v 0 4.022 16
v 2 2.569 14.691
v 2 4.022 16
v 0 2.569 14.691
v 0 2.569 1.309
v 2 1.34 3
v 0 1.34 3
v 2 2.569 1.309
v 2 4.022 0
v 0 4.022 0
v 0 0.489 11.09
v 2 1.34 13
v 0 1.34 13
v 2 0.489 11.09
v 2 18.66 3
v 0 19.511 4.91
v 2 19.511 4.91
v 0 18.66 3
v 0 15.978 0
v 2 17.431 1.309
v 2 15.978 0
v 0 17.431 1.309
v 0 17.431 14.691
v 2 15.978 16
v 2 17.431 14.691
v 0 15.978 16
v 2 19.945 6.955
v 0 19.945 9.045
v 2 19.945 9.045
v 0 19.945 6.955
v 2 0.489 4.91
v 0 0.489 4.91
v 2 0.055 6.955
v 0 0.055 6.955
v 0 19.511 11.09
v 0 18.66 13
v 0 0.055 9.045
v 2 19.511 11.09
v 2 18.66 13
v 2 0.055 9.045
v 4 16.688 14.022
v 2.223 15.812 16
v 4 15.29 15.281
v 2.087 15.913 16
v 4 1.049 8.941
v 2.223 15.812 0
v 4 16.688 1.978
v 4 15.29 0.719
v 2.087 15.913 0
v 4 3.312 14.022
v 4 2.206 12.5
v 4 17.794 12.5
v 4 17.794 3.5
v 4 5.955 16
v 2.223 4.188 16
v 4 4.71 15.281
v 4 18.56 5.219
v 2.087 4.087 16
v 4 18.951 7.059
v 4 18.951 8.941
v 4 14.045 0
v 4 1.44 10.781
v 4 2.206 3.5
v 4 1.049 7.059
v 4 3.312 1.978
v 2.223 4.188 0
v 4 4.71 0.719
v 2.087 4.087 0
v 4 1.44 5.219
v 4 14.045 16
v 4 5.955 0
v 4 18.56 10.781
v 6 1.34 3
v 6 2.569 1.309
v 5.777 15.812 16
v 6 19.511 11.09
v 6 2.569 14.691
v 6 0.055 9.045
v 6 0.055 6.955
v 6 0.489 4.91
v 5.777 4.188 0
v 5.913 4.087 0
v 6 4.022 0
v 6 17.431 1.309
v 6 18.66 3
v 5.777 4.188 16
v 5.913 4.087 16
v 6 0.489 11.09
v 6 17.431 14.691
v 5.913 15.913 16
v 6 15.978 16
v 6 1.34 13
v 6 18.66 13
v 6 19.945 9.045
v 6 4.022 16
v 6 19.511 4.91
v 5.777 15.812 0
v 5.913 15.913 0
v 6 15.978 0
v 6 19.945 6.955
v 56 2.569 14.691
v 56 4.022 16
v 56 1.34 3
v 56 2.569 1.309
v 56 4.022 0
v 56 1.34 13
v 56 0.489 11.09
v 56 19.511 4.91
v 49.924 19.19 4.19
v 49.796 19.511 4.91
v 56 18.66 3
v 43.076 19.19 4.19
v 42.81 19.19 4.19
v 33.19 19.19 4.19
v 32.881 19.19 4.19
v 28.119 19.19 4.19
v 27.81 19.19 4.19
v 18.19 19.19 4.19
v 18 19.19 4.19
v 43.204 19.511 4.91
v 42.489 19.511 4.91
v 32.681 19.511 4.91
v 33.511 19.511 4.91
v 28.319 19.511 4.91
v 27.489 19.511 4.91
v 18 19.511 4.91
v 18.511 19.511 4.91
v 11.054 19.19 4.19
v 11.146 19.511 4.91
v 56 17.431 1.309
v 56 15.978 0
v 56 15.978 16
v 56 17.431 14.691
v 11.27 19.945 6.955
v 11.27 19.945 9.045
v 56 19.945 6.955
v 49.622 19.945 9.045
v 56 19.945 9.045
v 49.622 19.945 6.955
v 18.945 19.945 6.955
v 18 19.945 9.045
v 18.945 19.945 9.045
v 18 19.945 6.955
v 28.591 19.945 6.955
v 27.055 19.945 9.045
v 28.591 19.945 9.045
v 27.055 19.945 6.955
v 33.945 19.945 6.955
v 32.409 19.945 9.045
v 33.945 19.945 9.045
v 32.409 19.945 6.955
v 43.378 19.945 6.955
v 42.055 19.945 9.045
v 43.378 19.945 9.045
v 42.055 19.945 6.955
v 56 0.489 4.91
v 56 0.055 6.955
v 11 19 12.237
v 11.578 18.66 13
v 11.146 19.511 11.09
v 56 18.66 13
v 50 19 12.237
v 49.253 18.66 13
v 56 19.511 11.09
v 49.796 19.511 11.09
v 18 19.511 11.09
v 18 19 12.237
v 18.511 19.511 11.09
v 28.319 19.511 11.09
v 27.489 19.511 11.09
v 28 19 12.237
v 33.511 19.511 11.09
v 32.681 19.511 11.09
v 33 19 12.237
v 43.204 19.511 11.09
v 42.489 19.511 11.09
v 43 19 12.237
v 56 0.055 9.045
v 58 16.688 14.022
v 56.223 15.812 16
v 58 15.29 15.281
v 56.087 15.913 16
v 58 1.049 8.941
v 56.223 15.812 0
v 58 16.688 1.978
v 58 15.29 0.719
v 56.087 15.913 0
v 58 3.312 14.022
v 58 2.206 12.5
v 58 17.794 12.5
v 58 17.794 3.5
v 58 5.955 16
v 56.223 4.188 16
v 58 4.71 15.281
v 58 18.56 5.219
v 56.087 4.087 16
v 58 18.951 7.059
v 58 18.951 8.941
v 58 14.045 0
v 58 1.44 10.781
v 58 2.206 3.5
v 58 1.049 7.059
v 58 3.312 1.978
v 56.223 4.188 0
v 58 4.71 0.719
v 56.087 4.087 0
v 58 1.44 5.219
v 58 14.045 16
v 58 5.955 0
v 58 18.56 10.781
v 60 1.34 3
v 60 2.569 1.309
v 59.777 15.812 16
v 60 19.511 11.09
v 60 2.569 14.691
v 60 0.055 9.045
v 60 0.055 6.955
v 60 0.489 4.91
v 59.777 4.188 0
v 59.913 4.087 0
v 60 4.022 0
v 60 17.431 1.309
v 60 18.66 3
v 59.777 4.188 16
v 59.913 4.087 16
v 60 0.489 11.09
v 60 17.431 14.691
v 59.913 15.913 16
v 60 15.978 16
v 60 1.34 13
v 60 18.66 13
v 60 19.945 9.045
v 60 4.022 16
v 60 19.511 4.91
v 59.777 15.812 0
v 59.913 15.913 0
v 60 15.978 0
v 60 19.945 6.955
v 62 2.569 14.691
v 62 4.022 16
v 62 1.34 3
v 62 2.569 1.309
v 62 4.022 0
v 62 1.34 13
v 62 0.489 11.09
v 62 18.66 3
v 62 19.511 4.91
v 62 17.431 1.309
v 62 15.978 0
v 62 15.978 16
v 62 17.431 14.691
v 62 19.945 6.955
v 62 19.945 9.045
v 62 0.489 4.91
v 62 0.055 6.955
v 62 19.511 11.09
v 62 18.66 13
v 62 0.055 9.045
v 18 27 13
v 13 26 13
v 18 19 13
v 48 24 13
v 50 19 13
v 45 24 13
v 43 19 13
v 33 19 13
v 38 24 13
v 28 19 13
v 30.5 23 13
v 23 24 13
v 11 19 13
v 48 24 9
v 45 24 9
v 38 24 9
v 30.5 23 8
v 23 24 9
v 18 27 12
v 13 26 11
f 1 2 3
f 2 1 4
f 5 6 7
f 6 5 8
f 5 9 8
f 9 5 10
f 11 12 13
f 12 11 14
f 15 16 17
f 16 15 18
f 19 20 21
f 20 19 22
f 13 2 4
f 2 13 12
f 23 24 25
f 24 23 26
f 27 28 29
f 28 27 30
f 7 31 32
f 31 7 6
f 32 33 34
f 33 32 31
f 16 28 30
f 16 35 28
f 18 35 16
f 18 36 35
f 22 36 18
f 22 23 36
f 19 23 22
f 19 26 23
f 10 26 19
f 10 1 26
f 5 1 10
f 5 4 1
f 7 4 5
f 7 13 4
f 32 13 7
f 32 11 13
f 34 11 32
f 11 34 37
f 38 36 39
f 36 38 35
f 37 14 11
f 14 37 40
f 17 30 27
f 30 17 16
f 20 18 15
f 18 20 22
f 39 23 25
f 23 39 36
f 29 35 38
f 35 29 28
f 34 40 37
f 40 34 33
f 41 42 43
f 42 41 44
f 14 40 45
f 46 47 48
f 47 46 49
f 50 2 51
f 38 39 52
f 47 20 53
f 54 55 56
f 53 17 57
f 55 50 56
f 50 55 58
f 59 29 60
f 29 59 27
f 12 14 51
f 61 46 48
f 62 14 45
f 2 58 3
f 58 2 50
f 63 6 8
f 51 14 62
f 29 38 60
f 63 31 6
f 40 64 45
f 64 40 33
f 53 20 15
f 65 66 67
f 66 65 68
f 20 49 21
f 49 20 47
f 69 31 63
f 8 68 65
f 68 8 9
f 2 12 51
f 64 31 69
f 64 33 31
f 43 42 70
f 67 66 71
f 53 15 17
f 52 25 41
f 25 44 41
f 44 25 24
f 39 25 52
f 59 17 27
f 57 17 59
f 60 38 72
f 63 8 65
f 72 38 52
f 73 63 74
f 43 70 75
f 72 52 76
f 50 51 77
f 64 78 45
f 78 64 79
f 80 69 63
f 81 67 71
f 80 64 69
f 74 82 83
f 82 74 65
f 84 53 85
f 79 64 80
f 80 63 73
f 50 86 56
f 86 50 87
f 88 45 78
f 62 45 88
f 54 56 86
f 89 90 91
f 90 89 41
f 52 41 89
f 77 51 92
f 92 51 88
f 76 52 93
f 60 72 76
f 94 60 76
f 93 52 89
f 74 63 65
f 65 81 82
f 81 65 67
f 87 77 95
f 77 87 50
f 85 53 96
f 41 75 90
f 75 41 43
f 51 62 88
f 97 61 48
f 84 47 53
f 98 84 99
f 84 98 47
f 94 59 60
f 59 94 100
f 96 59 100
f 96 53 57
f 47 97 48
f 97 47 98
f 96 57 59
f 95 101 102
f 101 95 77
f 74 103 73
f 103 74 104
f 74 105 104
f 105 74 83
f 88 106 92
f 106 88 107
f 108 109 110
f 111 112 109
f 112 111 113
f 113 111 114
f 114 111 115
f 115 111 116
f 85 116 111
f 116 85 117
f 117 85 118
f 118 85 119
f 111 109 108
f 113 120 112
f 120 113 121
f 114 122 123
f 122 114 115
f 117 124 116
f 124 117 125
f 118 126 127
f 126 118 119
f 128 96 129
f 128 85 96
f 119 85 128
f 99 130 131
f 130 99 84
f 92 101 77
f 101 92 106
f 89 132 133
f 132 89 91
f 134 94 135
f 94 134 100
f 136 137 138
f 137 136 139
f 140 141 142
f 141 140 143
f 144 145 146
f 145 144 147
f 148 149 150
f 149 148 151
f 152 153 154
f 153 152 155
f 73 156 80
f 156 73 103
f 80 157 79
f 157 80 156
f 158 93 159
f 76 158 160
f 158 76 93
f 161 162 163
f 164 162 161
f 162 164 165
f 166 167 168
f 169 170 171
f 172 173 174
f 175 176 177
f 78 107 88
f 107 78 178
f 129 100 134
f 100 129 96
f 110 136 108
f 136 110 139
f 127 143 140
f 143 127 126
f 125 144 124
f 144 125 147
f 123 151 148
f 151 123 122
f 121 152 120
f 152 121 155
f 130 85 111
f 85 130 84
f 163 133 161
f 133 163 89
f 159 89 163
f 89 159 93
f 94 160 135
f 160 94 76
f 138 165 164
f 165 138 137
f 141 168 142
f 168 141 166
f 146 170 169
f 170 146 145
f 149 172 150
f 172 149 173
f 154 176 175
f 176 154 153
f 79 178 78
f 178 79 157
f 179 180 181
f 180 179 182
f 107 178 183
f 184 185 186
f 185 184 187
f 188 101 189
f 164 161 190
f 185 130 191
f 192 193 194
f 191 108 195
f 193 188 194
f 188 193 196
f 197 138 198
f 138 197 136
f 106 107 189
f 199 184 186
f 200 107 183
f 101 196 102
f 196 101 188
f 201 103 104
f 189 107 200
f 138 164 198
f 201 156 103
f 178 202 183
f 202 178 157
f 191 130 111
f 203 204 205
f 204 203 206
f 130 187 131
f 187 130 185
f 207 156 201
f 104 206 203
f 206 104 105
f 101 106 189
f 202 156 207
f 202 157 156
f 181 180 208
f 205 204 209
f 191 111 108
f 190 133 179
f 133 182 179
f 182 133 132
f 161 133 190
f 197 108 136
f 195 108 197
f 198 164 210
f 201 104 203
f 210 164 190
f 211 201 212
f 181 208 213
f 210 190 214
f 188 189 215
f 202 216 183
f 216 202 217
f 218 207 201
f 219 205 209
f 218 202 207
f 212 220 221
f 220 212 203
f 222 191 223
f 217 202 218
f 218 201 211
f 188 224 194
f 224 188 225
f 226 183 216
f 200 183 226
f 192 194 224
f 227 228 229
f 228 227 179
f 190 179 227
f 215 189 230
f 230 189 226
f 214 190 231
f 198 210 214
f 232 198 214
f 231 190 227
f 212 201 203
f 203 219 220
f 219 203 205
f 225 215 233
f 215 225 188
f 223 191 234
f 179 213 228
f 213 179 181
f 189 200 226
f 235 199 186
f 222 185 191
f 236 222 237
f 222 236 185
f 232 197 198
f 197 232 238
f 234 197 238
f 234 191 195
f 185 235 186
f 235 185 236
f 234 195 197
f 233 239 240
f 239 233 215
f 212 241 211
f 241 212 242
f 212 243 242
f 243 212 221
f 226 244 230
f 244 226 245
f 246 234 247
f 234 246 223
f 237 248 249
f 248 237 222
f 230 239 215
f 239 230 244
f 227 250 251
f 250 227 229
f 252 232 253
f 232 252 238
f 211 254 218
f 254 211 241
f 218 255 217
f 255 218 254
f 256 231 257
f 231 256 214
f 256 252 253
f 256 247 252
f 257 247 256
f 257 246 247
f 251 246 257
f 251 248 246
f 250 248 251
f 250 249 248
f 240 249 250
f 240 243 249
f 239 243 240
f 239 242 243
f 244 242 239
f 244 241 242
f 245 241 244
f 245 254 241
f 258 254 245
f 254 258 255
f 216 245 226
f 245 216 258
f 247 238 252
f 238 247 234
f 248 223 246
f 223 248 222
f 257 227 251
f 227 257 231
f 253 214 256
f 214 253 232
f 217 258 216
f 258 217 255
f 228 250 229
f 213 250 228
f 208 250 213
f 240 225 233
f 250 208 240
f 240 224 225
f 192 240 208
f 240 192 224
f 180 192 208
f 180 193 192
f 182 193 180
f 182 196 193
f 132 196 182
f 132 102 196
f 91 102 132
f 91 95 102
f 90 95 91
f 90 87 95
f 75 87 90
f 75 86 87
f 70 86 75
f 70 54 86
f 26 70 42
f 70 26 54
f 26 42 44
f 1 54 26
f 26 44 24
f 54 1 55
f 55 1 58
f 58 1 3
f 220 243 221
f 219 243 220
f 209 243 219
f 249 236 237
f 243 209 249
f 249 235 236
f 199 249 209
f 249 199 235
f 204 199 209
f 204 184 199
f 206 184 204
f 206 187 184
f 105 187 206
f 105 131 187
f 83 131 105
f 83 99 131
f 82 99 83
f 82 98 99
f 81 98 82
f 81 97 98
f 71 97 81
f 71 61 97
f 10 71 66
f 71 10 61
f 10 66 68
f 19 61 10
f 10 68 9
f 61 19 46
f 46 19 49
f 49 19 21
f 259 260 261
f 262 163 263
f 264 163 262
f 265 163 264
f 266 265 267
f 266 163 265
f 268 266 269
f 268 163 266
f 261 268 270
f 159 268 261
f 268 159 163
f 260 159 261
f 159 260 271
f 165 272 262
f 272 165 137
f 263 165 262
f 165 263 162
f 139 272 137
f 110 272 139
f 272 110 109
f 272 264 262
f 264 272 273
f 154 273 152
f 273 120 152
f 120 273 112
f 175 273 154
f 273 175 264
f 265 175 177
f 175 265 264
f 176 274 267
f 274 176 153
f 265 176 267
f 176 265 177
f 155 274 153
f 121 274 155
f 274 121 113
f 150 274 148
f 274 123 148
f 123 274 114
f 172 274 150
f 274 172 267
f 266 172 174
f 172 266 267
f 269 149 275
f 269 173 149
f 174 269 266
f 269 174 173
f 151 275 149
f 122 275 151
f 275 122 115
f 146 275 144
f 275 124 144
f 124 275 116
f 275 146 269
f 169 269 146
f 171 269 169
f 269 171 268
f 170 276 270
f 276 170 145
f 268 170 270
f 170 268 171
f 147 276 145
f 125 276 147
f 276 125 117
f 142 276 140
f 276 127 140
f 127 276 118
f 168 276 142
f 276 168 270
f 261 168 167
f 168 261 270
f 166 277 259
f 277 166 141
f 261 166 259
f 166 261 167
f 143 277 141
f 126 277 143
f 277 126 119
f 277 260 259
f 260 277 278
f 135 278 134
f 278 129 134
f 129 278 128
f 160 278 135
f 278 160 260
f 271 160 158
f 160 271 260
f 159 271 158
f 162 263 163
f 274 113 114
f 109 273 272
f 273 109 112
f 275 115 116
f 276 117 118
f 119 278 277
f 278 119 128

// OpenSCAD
union() {
intersection() {
  translate([0,10,8]) rotate([0,90]) {
    cylinder(d=20,h=2);
    translate([0,0,2]) cylinder(d1=20,d2=18,h=2);
    translate([0,0,4]) cylinder(d1=18,d2=20,h=2);
    translate([0,0,6]) cylinder(d=20,h=50);
    translate([0,0,56]) cylinder(d1=20,d2=18,h=2);
    translate([0,0,58]) cylinder(d1=18,d2=20,h=2);
    translate([0,0,60]) cylinder(d=20,h=2);
  }
  cube([62,20,16]);
}
translate([-2,-1,4]) difference() {
  linear_extrude(9,convexity=5) {
    polygon([[13,20],[15,27],[20,28],[20,20],[25,25],[30,20],[32.5,24],[35,20],[40,25],[45,20],[47,25],[50,25],[52,20],[30,10]]);
  }
  translate([0,15,-5]) rotate([-45,0]) cube([62,20,20]);
}
}
